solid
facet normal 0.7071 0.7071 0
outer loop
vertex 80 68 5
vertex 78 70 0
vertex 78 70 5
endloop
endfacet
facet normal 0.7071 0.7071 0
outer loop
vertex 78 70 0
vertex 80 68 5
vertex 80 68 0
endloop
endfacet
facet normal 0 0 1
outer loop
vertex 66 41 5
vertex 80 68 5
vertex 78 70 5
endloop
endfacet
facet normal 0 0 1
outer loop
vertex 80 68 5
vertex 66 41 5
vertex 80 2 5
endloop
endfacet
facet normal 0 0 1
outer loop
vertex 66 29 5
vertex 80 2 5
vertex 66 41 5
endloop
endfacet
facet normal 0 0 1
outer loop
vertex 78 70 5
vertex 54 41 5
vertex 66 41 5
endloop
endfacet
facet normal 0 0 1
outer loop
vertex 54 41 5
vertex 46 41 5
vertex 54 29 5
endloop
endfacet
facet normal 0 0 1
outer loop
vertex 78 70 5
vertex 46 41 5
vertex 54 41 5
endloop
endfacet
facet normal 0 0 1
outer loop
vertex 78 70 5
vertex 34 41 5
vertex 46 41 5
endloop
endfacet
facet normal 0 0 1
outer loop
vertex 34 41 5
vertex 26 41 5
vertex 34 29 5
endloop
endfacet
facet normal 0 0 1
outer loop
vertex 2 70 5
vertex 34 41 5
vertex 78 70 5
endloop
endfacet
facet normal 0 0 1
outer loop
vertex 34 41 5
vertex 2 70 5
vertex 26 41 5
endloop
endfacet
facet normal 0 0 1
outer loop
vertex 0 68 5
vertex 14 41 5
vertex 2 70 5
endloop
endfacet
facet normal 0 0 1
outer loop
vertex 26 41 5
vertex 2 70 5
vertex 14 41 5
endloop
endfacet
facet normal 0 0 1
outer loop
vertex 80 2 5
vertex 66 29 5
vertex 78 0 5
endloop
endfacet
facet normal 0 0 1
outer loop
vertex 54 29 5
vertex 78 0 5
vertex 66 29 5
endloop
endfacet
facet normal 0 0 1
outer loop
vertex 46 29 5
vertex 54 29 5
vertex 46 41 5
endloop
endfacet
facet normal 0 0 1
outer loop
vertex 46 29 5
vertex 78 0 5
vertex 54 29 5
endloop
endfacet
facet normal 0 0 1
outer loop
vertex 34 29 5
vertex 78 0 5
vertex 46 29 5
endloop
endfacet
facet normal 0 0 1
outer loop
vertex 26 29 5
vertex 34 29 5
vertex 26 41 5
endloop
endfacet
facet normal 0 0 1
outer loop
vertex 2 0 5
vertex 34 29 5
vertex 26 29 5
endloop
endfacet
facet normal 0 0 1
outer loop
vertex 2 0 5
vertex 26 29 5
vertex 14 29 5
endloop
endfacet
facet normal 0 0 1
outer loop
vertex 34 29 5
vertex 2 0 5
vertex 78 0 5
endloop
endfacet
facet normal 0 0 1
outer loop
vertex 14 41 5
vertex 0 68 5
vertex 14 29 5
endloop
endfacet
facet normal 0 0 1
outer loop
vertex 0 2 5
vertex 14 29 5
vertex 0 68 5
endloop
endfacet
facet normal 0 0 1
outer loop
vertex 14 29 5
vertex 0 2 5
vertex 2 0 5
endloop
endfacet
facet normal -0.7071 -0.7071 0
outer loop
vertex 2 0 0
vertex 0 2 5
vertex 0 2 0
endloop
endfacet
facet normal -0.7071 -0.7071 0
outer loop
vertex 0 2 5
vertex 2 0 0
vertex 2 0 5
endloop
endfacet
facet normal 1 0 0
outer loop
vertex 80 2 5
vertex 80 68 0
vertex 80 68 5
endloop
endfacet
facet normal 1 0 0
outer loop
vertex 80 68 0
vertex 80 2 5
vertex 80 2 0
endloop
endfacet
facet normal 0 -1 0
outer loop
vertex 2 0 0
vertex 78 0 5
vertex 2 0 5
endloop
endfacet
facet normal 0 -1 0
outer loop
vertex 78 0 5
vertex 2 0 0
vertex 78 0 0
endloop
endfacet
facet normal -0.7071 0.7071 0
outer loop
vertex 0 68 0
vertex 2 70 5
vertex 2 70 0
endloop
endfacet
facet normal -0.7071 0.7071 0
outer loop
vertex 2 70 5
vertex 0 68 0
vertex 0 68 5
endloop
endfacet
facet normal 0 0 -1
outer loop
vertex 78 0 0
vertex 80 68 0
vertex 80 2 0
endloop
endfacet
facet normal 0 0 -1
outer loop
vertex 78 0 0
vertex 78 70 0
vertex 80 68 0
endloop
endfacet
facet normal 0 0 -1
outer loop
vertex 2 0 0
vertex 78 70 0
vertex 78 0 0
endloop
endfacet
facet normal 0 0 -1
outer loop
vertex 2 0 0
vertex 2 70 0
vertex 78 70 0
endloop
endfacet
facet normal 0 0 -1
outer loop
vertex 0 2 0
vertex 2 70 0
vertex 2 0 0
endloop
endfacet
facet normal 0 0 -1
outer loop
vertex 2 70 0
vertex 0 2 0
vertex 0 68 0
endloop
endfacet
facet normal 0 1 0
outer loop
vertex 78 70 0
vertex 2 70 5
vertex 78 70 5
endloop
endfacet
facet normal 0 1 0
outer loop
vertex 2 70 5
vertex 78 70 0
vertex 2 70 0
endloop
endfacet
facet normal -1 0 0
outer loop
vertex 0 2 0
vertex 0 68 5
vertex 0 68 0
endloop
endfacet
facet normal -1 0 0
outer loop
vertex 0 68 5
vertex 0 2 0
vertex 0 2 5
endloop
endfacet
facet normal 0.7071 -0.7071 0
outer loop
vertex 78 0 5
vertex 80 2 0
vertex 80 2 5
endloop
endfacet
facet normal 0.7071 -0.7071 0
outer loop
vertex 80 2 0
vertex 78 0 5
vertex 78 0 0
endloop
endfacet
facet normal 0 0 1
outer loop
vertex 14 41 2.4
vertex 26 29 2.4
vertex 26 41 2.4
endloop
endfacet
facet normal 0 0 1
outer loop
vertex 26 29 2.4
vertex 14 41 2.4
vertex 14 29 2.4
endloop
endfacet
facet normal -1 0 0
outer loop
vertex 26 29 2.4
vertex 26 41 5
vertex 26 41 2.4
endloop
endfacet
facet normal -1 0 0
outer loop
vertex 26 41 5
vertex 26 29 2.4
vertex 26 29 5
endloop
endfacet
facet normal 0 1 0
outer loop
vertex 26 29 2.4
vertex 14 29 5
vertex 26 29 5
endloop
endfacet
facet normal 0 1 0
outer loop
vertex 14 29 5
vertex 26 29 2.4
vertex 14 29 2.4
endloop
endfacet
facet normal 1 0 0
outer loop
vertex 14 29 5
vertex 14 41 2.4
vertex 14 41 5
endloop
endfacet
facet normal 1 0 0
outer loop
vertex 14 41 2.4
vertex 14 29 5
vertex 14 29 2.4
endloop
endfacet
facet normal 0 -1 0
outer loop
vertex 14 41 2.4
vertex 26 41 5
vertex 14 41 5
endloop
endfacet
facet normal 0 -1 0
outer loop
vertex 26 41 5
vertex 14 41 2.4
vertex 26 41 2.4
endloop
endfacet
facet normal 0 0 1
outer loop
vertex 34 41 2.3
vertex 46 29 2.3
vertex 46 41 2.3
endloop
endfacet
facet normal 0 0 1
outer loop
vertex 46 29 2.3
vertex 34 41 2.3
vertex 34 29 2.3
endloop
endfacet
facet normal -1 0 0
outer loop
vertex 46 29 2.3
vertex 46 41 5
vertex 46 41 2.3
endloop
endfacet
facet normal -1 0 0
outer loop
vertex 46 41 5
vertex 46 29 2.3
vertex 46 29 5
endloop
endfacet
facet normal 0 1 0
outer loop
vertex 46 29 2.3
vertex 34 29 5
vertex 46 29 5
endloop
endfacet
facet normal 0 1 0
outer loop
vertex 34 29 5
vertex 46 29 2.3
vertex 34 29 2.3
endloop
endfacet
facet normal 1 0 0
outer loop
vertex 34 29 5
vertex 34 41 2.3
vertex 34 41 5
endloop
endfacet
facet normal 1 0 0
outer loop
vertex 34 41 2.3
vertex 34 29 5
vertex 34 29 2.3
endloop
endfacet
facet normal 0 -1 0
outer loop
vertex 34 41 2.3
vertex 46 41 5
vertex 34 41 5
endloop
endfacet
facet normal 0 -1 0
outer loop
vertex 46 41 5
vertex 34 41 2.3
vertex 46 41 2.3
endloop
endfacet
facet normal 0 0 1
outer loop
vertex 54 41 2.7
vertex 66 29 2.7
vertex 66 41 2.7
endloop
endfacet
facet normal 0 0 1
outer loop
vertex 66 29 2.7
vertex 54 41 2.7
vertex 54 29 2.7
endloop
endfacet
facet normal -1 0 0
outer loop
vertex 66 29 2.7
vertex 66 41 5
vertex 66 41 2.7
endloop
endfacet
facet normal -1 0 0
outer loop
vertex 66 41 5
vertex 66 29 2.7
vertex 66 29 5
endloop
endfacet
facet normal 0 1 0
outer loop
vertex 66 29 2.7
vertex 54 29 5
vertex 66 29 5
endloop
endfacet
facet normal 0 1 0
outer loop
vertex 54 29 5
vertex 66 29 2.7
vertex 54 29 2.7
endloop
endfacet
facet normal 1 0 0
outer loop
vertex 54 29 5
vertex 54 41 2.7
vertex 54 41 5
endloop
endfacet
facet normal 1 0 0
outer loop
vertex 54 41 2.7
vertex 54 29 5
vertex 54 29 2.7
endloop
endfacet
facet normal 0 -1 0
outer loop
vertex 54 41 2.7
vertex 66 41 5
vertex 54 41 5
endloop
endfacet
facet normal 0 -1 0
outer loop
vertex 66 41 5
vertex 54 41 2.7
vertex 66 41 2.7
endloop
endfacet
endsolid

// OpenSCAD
$fn = 32;

// ----------------------------------------------------------------------
// Windowed plate: 3 voids, 80 x 70 x 5 mm
// ----------------------------------------------------------------------

// --- parameters (mm) ---
plate_l = 80;             // plate length, X
plate_w = 70;             // plate width, Y
plate_t = 5;              // plate thickness, Z
edge_margin = 10;         // wall from the plate edge to any window
windows = 3;              // number of windows in the row
win_l = 12;               // window length
win_w = 12;               // window width
win_pitch = 20;           // window pitch along X
depth_1 = 2.6;            // depth of void 1 (full thickness = through)
depth_2 = 2.7;            // depth of void 2 (full thickness = through)
depth_3 = 2.3;            // depth of void 3 (full thickness = through)
corner_c = 2;             // corner chamfer of the plate

profile = [[2, 0], [78, 0], [80, 2], [80, 68], [78, 70], [2, 70], [0, 68], [0, 2]];  // primary outline, 8 points, counter clockwise
void_1 = [[14, 29], [26, 29], [26, 41], [14, 41]];  // window 1 of the row, 4 points
void_2 = [[34, 29], [46, 29], [46, 41], [34, 41]];  // window 2 of the row, 4 points
void_3 = [[54, 29], [66, 29], [66, 41], [54, 41]];  // window 3 of the row, 4 points

// --- the one profile operation ---
difference() {
  linear_extrude(height = plate_t) polygon(points = profile);
  translate([0, 0, plate_t - depth_1])
    linear_extrude(height = depth_1 + 1) polygon(points = void_1);
  translate([0, 0, plate_t - depth_2])
    linear_extrude(height = depth_2 + 1) polygon(points = void_2);
  translate([0, 0, plate_t - depth_3])
    linear_extrude(height = depth_3 + 1) polygon(points = void_3);
}
